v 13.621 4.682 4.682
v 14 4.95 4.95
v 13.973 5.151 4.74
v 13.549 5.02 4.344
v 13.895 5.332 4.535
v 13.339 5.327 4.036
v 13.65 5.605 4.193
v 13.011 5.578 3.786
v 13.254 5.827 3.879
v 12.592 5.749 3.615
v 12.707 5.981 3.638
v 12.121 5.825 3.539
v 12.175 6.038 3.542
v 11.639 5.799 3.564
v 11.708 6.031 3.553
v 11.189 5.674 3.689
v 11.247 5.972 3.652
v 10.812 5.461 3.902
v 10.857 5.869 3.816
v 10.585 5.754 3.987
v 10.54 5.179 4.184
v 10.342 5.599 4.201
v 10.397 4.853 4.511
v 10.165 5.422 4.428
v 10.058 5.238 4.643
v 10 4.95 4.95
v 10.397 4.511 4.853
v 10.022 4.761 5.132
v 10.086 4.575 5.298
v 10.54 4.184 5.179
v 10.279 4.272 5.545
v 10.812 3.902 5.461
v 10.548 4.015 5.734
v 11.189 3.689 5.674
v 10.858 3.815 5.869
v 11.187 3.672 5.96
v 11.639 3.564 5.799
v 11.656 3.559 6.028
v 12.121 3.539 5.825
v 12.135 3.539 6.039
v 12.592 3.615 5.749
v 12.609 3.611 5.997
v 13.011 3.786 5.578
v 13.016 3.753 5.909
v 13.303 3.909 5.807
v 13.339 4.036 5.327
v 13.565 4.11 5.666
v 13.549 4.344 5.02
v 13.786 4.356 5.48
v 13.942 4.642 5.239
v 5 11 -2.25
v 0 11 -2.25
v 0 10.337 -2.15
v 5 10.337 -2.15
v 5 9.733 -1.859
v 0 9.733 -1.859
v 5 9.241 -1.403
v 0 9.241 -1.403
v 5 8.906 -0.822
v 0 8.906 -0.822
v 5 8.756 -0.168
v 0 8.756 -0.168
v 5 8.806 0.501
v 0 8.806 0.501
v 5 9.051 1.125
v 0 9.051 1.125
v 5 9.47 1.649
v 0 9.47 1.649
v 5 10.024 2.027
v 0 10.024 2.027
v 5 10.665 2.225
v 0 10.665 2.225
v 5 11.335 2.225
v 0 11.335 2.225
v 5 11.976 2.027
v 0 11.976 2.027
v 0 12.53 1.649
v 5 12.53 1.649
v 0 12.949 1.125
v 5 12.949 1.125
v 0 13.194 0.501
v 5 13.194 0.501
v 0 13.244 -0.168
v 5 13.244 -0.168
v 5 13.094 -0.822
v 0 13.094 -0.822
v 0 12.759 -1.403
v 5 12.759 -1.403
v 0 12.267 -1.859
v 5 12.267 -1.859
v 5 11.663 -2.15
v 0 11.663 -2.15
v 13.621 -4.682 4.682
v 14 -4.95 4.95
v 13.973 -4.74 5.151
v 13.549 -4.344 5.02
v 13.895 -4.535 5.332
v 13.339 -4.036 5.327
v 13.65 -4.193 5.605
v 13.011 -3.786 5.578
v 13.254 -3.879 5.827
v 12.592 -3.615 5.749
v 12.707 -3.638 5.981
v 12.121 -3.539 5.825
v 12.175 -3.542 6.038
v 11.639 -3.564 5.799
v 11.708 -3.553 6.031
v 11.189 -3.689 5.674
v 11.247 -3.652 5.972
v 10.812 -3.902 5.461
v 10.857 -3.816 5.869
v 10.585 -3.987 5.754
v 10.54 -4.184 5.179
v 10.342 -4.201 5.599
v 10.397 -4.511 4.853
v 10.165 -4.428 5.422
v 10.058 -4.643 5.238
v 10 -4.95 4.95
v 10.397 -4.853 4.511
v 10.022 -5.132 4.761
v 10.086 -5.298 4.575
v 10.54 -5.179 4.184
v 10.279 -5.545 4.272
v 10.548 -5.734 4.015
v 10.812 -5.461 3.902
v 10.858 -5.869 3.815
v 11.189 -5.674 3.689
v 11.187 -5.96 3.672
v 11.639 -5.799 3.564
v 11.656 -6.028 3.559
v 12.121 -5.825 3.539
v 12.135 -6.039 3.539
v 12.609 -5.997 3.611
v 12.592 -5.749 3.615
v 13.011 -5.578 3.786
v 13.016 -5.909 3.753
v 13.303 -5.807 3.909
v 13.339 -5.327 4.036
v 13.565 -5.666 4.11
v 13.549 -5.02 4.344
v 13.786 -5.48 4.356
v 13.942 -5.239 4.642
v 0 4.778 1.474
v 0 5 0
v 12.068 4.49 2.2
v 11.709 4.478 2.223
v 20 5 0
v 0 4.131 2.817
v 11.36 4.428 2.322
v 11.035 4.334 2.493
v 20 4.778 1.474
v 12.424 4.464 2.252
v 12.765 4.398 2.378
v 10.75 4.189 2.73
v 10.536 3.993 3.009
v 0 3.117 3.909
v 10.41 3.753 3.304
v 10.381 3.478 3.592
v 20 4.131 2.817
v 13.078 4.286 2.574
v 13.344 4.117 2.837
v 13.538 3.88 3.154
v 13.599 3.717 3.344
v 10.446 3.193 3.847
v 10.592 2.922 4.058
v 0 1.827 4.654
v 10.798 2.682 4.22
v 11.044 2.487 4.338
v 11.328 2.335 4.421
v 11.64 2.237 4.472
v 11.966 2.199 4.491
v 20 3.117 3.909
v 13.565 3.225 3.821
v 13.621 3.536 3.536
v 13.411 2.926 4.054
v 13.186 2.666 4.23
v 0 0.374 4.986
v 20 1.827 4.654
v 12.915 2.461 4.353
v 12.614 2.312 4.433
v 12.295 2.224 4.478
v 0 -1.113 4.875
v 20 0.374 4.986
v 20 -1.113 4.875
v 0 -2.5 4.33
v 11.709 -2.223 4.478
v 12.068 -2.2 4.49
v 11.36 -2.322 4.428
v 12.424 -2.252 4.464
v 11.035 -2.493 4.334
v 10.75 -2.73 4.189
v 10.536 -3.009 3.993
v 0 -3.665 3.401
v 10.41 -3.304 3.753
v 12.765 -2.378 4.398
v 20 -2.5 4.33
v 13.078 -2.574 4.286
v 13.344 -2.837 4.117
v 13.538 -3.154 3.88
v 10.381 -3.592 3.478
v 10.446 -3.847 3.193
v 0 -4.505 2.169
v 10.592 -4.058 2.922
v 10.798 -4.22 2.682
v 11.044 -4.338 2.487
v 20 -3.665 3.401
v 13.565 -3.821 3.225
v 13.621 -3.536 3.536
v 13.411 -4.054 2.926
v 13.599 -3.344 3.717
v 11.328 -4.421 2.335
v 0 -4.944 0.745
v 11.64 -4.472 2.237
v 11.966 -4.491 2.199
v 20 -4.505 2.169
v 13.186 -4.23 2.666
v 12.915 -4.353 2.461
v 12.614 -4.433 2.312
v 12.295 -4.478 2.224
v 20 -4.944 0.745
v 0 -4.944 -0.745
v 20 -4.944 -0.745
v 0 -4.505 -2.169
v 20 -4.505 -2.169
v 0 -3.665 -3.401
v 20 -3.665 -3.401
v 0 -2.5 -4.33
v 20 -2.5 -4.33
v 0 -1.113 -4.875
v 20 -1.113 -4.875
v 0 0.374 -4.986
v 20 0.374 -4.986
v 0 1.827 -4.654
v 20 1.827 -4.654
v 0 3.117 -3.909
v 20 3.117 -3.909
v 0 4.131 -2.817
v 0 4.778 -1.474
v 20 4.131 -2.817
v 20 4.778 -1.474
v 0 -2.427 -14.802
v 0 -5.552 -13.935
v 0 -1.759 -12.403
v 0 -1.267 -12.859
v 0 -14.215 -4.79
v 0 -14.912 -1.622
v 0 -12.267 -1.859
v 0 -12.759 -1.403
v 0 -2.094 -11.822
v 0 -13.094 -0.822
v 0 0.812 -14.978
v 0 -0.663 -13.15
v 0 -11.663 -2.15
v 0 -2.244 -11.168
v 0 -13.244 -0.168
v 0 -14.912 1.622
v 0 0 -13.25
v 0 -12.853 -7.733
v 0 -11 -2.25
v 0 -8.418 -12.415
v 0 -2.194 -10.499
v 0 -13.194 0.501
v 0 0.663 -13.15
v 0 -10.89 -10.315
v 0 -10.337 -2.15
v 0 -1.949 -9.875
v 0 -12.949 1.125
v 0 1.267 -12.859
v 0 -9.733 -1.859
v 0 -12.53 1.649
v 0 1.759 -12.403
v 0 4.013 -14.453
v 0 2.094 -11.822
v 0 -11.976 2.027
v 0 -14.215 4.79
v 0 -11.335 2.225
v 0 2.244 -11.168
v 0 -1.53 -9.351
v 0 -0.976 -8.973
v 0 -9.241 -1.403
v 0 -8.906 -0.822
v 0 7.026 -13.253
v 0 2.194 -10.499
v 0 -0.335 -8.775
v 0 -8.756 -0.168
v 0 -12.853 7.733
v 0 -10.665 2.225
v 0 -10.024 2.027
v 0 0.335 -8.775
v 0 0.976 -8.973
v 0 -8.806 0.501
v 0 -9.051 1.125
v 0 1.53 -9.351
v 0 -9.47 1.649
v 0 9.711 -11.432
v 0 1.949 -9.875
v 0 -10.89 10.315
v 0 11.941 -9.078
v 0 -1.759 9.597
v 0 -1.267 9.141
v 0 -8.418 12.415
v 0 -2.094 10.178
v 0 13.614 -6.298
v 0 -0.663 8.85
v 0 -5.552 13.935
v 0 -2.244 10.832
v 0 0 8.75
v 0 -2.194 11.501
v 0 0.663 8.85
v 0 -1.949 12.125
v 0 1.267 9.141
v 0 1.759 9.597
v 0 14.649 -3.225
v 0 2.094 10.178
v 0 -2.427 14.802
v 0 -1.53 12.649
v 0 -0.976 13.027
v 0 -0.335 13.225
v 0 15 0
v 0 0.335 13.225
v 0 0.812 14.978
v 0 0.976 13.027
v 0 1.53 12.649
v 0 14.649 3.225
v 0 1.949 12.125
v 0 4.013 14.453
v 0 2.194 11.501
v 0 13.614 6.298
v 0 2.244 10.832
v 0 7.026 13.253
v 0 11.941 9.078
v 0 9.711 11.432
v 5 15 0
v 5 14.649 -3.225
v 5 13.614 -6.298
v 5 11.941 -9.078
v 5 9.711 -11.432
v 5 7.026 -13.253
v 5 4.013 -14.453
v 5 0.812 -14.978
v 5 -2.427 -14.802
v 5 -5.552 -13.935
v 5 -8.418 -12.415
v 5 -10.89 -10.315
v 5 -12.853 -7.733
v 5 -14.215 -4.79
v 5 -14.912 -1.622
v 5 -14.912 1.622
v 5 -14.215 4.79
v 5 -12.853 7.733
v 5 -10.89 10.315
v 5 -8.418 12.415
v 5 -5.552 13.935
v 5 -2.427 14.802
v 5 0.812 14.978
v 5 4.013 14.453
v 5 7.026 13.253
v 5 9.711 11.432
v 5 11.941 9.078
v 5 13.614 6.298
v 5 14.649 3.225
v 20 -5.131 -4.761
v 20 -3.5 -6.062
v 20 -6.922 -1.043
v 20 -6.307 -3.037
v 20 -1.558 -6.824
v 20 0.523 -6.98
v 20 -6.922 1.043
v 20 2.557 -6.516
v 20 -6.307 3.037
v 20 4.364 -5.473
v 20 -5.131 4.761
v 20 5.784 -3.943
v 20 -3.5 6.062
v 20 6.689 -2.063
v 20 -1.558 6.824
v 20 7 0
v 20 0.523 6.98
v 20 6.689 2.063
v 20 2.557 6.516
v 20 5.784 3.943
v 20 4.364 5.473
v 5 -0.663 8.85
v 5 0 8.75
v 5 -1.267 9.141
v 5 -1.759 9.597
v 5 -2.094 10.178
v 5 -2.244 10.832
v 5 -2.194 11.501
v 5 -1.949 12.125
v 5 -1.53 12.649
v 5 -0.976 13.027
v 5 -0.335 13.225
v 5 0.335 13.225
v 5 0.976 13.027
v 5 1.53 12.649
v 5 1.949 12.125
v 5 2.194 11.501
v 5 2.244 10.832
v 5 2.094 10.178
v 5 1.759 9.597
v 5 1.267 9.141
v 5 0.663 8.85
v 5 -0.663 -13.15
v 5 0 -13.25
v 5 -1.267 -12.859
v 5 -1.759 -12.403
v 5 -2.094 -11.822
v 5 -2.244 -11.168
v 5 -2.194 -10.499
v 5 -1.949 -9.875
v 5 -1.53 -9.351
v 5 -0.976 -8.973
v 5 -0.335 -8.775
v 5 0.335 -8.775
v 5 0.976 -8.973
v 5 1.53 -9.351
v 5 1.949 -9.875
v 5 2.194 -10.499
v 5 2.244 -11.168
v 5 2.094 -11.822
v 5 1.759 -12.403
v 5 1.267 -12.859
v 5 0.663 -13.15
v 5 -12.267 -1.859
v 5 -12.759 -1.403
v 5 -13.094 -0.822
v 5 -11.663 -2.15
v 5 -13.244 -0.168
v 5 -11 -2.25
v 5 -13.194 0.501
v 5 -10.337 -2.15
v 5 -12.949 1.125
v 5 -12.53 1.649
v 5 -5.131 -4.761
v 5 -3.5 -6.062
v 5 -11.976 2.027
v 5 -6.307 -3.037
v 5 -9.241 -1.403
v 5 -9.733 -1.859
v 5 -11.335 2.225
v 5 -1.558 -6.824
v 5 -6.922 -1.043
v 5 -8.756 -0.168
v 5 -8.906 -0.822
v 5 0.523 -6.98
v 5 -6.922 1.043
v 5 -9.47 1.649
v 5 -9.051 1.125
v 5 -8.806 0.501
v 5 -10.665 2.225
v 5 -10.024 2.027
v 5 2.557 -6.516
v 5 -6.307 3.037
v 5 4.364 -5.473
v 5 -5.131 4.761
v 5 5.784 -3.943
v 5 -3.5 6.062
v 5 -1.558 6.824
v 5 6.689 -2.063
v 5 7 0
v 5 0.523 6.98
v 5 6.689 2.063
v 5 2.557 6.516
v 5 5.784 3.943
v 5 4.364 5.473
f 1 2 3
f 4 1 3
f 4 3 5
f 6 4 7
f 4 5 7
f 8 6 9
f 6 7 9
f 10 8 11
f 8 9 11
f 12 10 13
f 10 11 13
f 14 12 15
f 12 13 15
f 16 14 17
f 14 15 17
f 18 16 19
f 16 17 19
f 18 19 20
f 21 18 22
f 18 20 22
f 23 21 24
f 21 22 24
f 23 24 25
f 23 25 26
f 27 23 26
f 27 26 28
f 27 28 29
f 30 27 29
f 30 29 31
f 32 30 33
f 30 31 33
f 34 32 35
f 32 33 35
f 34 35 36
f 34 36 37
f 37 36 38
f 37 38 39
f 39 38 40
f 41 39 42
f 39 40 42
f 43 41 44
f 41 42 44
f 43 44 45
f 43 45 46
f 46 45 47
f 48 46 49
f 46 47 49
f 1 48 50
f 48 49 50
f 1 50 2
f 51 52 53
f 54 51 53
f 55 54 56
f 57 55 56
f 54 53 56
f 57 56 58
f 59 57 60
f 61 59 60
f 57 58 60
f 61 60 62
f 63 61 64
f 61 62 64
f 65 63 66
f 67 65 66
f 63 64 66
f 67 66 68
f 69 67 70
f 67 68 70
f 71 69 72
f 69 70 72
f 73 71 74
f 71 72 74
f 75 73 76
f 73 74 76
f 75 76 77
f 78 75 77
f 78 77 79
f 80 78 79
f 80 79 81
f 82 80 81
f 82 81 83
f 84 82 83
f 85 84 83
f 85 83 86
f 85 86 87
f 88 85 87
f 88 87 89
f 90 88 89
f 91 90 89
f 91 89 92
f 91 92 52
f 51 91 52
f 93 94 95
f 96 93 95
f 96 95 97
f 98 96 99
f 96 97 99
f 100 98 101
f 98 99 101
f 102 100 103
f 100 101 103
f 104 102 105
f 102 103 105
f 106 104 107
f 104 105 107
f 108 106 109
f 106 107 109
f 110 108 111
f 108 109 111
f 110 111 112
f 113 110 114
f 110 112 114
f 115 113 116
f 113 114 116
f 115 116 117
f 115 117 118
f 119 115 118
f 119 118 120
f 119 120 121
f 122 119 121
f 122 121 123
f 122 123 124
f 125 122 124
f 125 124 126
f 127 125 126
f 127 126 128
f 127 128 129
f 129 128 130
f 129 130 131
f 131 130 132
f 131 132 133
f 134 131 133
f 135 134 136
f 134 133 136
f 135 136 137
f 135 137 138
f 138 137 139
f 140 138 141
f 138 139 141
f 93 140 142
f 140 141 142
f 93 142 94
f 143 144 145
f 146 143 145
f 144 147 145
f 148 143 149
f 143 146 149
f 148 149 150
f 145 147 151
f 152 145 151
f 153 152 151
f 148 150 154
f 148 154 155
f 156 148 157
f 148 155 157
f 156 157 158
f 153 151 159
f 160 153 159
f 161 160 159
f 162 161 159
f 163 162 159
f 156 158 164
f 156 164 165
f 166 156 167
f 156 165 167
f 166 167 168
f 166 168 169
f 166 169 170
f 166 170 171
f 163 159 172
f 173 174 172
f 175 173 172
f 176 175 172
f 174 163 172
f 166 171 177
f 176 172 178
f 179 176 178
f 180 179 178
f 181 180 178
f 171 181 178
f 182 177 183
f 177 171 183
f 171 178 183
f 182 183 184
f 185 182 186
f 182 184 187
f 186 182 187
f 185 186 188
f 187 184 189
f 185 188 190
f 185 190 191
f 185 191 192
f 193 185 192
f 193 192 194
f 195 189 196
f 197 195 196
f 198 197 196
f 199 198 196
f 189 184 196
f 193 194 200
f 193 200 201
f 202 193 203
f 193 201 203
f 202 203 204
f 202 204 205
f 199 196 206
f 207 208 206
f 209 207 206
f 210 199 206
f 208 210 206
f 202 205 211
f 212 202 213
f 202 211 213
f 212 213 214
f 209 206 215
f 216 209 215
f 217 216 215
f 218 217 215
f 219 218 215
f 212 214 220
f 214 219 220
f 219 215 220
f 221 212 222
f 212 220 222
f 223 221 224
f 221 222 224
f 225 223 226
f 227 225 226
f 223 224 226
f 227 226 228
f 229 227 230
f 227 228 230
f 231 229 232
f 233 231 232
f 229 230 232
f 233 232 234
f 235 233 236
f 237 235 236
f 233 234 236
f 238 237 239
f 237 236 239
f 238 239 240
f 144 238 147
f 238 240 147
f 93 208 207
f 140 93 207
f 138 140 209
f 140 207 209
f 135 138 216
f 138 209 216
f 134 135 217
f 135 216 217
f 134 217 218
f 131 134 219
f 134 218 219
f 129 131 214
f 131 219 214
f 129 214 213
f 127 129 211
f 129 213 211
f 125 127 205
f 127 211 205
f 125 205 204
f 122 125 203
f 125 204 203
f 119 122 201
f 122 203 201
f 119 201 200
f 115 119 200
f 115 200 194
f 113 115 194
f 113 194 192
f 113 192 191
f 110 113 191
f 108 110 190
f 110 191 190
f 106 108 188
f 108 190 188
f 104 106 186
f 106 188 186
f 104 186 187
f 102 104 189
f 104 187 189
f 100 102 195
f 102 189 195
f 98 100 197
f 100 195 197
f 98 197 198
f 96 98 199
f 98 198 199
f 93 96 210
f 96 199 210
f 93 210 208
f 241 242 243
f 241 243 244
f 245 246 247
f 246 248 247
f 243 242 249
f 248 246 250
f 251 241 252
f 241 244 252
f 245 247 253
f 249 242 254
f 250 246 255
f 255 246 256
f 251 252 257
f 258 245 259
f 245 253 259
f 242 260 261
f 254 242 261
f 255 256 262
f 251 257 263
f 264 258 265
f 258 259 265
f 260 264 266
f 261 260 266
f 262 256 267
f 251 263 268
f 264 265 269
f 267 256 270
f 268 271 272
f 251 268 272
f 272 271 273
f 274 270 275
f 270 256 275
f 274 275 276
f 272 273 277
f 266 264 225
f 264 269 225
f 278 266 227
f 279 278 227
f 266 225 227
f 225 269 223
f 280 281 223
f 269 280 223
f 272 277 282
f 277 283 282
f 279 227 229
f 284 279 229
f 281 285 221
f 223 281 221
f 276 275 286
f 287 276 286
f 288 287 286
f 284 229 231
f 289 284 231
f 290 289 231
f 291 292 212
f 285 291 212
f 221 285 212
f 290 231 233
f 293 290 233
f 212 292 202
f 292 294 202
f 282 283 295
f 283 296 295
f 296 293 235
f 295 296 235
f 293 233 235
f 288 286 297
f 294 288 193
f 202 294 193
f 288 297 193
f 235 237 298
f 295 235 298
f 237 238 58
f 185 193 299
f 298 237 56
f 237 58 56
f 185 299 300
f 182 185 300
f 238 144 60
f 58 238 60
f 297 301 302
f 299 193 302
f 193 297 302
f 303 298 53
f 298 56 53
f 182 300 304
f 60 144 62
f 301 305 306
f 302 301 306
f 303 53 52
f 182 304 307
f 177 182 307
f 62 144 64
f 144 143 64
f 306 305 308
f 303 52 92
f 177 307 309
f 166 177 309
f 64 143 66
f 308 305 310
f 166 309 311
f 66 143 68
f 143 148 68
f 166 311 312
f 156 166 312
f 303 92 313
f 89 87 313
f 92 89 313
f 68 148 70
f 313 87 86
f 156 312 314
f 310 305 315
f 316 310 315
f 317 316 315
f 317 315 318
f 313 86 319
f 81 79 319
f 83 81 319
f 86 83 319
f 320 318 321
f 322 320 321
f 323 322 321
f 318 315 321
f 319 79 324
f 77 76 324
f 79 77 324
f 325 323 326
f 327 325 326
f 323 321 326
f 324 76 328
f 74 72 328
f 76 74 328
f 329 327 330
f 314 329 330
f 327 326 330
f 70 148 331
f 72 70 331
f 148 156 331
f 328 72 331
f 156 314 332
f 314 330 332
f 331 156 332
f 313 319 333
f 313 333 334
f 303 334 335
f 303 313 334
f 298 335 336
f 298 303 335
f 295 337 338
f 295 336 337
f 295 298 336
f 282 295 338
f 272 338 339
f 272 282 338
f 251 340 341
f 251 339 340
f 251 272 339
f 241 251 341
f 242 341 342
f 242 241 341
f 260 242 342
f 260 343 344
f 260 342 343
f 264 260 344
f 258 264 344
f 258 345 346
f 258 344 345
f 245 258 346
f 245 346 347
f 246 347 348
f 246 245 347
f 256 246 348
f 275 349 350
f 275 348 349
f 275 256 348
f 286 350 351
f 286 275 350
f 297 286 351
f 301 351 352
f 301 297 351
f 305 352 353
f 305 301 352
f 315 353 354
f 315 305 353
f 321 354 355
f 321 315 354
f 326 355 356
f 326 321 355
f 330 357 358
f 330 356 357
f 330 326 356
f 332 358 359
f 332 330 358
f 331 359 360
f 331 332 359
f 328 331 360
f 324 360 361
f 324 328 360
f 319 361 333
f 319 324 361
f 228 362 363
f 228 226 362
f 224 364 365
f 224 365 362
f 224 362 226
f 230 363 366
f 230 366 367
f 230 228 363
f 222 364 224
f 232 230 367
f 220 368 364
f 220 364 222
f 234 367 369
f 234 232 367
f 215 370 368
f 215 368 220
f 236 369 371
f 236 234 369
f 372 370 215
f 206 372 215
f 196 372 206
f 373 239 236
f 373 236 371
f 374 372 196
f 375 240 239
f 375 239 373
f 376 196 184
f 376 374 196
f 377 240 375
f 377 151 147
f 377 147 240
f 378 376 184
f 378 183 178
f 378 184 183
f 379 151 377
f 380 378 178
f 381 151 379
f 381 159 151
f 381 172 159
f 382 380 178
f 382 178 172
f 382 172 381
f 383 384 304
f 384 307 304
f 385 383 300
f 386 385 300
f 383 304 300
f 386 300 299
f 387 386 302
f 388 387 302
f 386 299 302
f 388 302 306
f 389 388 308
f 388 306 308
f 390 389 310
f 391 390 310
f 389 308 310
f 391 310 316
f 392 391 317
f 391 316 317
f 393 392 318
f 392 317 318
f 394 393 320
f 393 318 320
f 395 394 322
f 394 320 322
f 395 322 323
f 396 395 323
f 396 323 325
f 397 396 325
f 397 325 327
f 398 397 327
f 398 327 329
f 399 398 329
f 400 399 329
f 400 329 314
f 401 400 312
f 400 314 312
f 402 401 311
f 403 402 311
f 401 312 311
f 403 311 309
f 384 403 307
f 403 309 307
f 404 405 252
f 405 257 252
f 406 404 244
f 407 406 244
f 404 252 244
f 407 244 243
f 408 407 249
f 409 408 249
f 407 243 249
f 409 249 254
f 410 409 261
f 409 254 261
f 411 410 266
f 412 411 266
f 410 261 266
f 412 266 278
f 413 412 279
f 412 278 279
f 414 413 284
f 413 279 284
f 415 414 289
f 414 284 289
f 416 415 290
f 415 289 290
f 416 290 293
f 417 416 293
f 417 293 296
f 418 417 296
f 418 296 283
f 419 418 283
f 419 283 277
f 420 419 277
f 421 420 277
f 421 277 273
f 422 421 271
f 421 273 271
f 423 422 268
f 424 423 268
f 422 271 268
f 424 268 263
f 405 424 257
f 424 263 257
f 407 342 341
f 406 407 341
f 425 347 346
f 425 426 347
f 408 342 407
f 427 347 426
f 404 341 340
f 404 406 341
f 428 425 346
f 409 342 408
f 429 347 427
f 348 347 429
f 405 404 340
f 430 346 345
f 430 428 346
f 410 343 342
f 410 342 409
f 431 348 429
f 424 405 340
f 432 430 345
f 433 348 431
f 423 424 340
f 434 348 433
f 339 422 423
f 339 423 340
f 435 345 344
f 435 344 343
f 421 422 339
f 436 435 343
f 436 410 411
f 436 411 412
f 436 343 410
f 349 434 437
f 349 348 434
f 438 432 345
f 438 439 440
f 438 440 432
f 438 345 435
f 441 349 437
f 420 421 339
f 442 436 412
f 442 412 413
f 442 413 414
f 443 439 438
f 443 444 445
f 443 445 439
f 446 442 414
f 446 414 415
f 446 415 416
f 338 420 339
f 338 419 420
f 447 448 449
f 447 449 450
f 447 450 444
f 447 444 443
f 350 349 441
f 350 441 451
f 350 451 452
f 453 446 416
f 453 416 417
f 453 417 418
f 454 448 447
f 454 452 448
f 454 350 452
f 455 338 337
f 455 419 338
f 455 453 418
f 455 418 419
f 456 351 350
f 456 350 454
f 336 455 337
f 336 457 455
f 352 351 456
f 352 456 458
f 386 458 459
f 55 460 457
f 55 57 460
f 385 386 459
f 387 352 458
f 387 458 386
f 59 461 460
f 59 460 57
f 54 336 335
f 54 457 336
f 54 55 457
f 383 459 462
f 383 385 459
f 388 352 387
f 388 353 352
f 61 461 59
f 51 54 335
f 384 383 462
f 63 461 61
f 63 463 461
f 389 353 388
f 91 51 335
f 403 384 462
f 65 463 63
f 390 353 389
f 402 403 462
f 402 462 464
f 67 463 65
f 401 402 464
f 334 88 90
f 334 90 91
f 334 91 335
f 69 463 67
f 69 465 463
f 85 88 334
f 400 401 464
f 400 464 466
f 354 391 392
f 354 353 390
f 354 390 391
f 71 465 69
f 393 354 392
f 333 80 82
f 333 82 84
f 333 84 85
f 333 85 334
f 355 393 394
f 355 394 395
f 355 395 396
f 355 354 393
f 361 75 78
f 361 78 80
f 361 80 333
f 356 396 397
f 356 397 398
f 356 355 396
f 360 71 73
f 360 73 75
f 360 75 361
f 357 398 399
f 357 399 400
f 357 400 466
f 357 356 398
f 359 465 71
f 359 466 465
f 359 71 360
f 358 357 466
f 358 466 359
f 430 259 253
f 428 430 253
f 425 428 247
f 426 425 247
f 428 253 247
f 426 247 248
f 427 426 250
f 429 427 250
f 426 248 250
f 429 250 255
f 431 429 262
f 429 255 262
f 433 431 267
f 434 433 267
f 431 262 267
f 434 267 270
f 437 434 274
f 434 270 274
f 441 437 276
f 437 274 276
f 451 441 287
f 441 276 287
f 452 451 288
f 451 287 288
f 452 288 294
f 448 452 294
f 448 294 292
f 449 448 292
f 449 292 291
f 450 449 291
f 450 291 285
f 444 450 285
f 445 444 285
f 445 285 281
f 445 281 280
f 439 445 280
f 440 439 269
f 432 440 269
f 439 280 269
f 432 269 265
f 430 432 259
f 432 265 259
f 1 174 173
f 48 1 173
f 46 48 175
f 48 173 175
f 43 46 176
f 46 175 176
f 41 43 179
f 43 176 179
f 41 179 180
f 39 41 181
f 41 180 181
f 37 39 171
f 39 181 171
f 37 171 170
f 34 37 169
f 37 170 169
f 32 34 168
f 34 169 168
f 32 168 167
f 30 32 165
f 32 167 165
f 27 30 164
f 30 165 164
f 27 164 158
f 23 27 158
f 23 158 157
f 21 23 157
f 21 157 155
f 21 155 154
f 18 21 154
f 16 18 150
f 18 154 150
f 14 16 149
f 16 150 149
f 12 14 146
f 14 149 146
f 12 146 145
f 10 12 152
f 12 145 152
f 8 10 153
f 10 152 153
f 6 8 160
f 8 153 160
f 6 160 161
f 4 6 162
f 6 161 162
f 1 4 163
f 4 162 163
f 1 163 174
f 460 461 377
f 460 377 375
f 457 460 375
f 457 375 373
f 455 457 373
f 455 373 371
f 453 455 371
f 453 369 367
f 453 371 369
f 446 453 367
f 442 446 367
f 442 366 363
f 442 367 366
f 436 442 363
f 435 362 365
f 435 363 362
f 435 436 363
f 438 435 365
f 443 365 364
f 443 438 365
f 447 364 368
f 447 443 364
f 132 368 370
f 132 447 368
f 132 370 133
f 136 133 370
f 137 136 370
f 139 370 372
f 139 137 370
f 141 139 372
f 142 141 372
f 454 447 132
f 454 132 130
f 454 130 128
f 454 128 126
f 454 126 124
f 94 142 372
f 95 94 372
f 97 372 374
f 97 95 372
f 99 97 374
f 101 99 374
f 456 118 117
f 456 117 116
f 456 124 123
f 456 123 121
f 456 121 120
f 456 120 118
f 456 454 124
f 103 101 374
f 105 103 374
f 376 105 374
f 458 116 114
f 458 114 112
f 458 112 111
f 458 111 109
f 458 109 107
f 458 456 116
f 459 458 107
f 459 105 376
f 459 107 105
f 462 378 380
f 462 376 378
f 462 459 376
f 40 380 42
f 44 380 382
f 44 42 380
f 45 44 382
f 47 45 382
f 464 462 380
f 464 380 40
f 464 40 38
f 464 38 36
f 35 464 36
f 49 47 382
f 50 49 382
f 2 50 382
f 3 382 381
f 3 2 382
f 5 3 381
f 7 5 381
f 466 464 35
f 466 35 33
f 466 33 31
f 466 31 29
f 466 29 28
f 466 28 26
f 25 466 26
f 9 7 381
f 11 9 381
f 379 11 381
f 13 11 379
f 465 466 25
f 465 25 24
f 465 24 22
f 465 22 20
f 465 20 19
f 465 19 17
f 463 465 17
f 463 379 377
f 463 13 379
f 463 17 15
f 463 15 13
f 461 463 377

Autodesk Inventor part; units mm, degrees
sketch "Sketch_1" plane through (0, 0, 0) normal (0, 0, 1) x (1, 0, 0)
  line L0 (20, 0) -> (0, 0)
  line L1 (0, 15) -> (0, 5)
  line L2 (0, 5) -> (20, 5)
  line L3 (20, 5) -> (20, 7)
  line L4 (20, 7) -> (5, 7)
  line L5 (5, 7) -> (5, 15)
  line L6 (5, 15) -> (0, 15)
revolve "Revolution1" add sketch "Sketch_1" angle 360 about axis through (20, 0, 0) along (1, 0, 0)
sketch "Sketch_3" plane through (0, 0, 0) normal (0, -0.7071, 0.7071) x (1, 0, 0)
  line L0 (12, 4.5) -> (12, 7)
  line L1 (12, 7) -> (14, 7)
  line L2 (14, 7) -> (13.621, 6.621)
  line L3 (13.621, 6.621) -> (13.621, 4.5)
  line L4 (13.621, 4.5) -> (12, 4.5)
  line L5 (12, 4.5) -> (12, 7)
revolve "Revolution2" cut sketch "Sketch_3" angle 360 about axis through (12, 3.182, 3.182) along (0, -0.7071, -0.7071)
thread "Thread1" size "M4x0.7" class "6H" standard "ISO Metric profile" length 2.121
sketch "Sketch3" plane through (5, 0, 0) normal (1, 0, 0) x (0, 0, -1)
  point P0 (0, 11)
hole "Hole1" at (5, 11, 0) direction (-1, 0, 0) diameter 4.5 depth 5
sketch "Sketch4" plane through (5, 0, 0) normal (1, 0, 0) x (0, 0, -1)
  point P0 (0, -11)
hole "Hole2" at (5, -11, 0) direction (-1, 0, 0) diameter 4.5 depth 5
sketch "Sketch5" plane through (5, 0, 0) normal (1, 0, 0) x (0, 0, -1)
  point P0 (-11, 0)
hole "Hole3" at (5, 0, 11) direction (-1, 0, 0) diameter 4.5 depth 5
sketch "Sketch6" plane through (5, 0, 0) normal (1, 0, 0) x (0, 0, -1)
  point P0 (11, 0)
hole "Hole4" at (5, 0, -11) direction (-1, 0, 0) diameter 4.5 depth 5
sketch "Sketch_2" plane through (0, 0, 0) normal (0, -0.7071, -0.7071) x (1, 0, 0)
  line L0 (12, 4.5) -> (12, 7)
  line L1 (12, 7) -> (14, 7)
  line L2 (14, 7) -> (13.621, 6.621)
  line L3 (13.621, 6.621) -> (13.621, 4.5)
  line L4 (13.621, 4.5) -> (12, 4.5)
  line L5 (12, 4.5) -> (12, 7)
revolve "Revolution3" cut sketch "Sketch_2" angle 360 about axis through (12, -3.182, 3.182) along (0, 0.7071, -0.7071)
thread "Thread2" size "M4x0.7" class "6H" standard "ISO Metric profile" length 2.121
ref_plane "to_screw1_XY" through (12, 3.5355, 3.5355) normal (0, 0.7071, 0.7071) x (1, 0, 0)
ref_plane "to_screw1_YZ" through (12, 3.5355, 3.5355) normal (1, 0, 0) x (0, 0.7071, -0.7071)
ref_plane "to_screw1_ZX" through (12, 3.5355, 3.5355) normal (0, 0.7071, -0.7071) x (0, 0.7071, 0.7071)
ref_plane "to_screw2_XY" through (12, -3.5355, 3.5355) normal (0, -0.7071, 0.7071) x (1, 0, 0)
ref_plane "to_screw2_YZ" through (12, -3.5355, 3.5355) normal (1, 0, 0) x (0, 0.7071, 0.7071)
ref_plane "to_screw2_ZX" through (12, -3.5355, 3.5355) normal (0, 0.7071, 0.7071) x (0, -0.7071, 0.7071)
properties part number "STHRB10M-MB_b" material "ステンレス鋼"
